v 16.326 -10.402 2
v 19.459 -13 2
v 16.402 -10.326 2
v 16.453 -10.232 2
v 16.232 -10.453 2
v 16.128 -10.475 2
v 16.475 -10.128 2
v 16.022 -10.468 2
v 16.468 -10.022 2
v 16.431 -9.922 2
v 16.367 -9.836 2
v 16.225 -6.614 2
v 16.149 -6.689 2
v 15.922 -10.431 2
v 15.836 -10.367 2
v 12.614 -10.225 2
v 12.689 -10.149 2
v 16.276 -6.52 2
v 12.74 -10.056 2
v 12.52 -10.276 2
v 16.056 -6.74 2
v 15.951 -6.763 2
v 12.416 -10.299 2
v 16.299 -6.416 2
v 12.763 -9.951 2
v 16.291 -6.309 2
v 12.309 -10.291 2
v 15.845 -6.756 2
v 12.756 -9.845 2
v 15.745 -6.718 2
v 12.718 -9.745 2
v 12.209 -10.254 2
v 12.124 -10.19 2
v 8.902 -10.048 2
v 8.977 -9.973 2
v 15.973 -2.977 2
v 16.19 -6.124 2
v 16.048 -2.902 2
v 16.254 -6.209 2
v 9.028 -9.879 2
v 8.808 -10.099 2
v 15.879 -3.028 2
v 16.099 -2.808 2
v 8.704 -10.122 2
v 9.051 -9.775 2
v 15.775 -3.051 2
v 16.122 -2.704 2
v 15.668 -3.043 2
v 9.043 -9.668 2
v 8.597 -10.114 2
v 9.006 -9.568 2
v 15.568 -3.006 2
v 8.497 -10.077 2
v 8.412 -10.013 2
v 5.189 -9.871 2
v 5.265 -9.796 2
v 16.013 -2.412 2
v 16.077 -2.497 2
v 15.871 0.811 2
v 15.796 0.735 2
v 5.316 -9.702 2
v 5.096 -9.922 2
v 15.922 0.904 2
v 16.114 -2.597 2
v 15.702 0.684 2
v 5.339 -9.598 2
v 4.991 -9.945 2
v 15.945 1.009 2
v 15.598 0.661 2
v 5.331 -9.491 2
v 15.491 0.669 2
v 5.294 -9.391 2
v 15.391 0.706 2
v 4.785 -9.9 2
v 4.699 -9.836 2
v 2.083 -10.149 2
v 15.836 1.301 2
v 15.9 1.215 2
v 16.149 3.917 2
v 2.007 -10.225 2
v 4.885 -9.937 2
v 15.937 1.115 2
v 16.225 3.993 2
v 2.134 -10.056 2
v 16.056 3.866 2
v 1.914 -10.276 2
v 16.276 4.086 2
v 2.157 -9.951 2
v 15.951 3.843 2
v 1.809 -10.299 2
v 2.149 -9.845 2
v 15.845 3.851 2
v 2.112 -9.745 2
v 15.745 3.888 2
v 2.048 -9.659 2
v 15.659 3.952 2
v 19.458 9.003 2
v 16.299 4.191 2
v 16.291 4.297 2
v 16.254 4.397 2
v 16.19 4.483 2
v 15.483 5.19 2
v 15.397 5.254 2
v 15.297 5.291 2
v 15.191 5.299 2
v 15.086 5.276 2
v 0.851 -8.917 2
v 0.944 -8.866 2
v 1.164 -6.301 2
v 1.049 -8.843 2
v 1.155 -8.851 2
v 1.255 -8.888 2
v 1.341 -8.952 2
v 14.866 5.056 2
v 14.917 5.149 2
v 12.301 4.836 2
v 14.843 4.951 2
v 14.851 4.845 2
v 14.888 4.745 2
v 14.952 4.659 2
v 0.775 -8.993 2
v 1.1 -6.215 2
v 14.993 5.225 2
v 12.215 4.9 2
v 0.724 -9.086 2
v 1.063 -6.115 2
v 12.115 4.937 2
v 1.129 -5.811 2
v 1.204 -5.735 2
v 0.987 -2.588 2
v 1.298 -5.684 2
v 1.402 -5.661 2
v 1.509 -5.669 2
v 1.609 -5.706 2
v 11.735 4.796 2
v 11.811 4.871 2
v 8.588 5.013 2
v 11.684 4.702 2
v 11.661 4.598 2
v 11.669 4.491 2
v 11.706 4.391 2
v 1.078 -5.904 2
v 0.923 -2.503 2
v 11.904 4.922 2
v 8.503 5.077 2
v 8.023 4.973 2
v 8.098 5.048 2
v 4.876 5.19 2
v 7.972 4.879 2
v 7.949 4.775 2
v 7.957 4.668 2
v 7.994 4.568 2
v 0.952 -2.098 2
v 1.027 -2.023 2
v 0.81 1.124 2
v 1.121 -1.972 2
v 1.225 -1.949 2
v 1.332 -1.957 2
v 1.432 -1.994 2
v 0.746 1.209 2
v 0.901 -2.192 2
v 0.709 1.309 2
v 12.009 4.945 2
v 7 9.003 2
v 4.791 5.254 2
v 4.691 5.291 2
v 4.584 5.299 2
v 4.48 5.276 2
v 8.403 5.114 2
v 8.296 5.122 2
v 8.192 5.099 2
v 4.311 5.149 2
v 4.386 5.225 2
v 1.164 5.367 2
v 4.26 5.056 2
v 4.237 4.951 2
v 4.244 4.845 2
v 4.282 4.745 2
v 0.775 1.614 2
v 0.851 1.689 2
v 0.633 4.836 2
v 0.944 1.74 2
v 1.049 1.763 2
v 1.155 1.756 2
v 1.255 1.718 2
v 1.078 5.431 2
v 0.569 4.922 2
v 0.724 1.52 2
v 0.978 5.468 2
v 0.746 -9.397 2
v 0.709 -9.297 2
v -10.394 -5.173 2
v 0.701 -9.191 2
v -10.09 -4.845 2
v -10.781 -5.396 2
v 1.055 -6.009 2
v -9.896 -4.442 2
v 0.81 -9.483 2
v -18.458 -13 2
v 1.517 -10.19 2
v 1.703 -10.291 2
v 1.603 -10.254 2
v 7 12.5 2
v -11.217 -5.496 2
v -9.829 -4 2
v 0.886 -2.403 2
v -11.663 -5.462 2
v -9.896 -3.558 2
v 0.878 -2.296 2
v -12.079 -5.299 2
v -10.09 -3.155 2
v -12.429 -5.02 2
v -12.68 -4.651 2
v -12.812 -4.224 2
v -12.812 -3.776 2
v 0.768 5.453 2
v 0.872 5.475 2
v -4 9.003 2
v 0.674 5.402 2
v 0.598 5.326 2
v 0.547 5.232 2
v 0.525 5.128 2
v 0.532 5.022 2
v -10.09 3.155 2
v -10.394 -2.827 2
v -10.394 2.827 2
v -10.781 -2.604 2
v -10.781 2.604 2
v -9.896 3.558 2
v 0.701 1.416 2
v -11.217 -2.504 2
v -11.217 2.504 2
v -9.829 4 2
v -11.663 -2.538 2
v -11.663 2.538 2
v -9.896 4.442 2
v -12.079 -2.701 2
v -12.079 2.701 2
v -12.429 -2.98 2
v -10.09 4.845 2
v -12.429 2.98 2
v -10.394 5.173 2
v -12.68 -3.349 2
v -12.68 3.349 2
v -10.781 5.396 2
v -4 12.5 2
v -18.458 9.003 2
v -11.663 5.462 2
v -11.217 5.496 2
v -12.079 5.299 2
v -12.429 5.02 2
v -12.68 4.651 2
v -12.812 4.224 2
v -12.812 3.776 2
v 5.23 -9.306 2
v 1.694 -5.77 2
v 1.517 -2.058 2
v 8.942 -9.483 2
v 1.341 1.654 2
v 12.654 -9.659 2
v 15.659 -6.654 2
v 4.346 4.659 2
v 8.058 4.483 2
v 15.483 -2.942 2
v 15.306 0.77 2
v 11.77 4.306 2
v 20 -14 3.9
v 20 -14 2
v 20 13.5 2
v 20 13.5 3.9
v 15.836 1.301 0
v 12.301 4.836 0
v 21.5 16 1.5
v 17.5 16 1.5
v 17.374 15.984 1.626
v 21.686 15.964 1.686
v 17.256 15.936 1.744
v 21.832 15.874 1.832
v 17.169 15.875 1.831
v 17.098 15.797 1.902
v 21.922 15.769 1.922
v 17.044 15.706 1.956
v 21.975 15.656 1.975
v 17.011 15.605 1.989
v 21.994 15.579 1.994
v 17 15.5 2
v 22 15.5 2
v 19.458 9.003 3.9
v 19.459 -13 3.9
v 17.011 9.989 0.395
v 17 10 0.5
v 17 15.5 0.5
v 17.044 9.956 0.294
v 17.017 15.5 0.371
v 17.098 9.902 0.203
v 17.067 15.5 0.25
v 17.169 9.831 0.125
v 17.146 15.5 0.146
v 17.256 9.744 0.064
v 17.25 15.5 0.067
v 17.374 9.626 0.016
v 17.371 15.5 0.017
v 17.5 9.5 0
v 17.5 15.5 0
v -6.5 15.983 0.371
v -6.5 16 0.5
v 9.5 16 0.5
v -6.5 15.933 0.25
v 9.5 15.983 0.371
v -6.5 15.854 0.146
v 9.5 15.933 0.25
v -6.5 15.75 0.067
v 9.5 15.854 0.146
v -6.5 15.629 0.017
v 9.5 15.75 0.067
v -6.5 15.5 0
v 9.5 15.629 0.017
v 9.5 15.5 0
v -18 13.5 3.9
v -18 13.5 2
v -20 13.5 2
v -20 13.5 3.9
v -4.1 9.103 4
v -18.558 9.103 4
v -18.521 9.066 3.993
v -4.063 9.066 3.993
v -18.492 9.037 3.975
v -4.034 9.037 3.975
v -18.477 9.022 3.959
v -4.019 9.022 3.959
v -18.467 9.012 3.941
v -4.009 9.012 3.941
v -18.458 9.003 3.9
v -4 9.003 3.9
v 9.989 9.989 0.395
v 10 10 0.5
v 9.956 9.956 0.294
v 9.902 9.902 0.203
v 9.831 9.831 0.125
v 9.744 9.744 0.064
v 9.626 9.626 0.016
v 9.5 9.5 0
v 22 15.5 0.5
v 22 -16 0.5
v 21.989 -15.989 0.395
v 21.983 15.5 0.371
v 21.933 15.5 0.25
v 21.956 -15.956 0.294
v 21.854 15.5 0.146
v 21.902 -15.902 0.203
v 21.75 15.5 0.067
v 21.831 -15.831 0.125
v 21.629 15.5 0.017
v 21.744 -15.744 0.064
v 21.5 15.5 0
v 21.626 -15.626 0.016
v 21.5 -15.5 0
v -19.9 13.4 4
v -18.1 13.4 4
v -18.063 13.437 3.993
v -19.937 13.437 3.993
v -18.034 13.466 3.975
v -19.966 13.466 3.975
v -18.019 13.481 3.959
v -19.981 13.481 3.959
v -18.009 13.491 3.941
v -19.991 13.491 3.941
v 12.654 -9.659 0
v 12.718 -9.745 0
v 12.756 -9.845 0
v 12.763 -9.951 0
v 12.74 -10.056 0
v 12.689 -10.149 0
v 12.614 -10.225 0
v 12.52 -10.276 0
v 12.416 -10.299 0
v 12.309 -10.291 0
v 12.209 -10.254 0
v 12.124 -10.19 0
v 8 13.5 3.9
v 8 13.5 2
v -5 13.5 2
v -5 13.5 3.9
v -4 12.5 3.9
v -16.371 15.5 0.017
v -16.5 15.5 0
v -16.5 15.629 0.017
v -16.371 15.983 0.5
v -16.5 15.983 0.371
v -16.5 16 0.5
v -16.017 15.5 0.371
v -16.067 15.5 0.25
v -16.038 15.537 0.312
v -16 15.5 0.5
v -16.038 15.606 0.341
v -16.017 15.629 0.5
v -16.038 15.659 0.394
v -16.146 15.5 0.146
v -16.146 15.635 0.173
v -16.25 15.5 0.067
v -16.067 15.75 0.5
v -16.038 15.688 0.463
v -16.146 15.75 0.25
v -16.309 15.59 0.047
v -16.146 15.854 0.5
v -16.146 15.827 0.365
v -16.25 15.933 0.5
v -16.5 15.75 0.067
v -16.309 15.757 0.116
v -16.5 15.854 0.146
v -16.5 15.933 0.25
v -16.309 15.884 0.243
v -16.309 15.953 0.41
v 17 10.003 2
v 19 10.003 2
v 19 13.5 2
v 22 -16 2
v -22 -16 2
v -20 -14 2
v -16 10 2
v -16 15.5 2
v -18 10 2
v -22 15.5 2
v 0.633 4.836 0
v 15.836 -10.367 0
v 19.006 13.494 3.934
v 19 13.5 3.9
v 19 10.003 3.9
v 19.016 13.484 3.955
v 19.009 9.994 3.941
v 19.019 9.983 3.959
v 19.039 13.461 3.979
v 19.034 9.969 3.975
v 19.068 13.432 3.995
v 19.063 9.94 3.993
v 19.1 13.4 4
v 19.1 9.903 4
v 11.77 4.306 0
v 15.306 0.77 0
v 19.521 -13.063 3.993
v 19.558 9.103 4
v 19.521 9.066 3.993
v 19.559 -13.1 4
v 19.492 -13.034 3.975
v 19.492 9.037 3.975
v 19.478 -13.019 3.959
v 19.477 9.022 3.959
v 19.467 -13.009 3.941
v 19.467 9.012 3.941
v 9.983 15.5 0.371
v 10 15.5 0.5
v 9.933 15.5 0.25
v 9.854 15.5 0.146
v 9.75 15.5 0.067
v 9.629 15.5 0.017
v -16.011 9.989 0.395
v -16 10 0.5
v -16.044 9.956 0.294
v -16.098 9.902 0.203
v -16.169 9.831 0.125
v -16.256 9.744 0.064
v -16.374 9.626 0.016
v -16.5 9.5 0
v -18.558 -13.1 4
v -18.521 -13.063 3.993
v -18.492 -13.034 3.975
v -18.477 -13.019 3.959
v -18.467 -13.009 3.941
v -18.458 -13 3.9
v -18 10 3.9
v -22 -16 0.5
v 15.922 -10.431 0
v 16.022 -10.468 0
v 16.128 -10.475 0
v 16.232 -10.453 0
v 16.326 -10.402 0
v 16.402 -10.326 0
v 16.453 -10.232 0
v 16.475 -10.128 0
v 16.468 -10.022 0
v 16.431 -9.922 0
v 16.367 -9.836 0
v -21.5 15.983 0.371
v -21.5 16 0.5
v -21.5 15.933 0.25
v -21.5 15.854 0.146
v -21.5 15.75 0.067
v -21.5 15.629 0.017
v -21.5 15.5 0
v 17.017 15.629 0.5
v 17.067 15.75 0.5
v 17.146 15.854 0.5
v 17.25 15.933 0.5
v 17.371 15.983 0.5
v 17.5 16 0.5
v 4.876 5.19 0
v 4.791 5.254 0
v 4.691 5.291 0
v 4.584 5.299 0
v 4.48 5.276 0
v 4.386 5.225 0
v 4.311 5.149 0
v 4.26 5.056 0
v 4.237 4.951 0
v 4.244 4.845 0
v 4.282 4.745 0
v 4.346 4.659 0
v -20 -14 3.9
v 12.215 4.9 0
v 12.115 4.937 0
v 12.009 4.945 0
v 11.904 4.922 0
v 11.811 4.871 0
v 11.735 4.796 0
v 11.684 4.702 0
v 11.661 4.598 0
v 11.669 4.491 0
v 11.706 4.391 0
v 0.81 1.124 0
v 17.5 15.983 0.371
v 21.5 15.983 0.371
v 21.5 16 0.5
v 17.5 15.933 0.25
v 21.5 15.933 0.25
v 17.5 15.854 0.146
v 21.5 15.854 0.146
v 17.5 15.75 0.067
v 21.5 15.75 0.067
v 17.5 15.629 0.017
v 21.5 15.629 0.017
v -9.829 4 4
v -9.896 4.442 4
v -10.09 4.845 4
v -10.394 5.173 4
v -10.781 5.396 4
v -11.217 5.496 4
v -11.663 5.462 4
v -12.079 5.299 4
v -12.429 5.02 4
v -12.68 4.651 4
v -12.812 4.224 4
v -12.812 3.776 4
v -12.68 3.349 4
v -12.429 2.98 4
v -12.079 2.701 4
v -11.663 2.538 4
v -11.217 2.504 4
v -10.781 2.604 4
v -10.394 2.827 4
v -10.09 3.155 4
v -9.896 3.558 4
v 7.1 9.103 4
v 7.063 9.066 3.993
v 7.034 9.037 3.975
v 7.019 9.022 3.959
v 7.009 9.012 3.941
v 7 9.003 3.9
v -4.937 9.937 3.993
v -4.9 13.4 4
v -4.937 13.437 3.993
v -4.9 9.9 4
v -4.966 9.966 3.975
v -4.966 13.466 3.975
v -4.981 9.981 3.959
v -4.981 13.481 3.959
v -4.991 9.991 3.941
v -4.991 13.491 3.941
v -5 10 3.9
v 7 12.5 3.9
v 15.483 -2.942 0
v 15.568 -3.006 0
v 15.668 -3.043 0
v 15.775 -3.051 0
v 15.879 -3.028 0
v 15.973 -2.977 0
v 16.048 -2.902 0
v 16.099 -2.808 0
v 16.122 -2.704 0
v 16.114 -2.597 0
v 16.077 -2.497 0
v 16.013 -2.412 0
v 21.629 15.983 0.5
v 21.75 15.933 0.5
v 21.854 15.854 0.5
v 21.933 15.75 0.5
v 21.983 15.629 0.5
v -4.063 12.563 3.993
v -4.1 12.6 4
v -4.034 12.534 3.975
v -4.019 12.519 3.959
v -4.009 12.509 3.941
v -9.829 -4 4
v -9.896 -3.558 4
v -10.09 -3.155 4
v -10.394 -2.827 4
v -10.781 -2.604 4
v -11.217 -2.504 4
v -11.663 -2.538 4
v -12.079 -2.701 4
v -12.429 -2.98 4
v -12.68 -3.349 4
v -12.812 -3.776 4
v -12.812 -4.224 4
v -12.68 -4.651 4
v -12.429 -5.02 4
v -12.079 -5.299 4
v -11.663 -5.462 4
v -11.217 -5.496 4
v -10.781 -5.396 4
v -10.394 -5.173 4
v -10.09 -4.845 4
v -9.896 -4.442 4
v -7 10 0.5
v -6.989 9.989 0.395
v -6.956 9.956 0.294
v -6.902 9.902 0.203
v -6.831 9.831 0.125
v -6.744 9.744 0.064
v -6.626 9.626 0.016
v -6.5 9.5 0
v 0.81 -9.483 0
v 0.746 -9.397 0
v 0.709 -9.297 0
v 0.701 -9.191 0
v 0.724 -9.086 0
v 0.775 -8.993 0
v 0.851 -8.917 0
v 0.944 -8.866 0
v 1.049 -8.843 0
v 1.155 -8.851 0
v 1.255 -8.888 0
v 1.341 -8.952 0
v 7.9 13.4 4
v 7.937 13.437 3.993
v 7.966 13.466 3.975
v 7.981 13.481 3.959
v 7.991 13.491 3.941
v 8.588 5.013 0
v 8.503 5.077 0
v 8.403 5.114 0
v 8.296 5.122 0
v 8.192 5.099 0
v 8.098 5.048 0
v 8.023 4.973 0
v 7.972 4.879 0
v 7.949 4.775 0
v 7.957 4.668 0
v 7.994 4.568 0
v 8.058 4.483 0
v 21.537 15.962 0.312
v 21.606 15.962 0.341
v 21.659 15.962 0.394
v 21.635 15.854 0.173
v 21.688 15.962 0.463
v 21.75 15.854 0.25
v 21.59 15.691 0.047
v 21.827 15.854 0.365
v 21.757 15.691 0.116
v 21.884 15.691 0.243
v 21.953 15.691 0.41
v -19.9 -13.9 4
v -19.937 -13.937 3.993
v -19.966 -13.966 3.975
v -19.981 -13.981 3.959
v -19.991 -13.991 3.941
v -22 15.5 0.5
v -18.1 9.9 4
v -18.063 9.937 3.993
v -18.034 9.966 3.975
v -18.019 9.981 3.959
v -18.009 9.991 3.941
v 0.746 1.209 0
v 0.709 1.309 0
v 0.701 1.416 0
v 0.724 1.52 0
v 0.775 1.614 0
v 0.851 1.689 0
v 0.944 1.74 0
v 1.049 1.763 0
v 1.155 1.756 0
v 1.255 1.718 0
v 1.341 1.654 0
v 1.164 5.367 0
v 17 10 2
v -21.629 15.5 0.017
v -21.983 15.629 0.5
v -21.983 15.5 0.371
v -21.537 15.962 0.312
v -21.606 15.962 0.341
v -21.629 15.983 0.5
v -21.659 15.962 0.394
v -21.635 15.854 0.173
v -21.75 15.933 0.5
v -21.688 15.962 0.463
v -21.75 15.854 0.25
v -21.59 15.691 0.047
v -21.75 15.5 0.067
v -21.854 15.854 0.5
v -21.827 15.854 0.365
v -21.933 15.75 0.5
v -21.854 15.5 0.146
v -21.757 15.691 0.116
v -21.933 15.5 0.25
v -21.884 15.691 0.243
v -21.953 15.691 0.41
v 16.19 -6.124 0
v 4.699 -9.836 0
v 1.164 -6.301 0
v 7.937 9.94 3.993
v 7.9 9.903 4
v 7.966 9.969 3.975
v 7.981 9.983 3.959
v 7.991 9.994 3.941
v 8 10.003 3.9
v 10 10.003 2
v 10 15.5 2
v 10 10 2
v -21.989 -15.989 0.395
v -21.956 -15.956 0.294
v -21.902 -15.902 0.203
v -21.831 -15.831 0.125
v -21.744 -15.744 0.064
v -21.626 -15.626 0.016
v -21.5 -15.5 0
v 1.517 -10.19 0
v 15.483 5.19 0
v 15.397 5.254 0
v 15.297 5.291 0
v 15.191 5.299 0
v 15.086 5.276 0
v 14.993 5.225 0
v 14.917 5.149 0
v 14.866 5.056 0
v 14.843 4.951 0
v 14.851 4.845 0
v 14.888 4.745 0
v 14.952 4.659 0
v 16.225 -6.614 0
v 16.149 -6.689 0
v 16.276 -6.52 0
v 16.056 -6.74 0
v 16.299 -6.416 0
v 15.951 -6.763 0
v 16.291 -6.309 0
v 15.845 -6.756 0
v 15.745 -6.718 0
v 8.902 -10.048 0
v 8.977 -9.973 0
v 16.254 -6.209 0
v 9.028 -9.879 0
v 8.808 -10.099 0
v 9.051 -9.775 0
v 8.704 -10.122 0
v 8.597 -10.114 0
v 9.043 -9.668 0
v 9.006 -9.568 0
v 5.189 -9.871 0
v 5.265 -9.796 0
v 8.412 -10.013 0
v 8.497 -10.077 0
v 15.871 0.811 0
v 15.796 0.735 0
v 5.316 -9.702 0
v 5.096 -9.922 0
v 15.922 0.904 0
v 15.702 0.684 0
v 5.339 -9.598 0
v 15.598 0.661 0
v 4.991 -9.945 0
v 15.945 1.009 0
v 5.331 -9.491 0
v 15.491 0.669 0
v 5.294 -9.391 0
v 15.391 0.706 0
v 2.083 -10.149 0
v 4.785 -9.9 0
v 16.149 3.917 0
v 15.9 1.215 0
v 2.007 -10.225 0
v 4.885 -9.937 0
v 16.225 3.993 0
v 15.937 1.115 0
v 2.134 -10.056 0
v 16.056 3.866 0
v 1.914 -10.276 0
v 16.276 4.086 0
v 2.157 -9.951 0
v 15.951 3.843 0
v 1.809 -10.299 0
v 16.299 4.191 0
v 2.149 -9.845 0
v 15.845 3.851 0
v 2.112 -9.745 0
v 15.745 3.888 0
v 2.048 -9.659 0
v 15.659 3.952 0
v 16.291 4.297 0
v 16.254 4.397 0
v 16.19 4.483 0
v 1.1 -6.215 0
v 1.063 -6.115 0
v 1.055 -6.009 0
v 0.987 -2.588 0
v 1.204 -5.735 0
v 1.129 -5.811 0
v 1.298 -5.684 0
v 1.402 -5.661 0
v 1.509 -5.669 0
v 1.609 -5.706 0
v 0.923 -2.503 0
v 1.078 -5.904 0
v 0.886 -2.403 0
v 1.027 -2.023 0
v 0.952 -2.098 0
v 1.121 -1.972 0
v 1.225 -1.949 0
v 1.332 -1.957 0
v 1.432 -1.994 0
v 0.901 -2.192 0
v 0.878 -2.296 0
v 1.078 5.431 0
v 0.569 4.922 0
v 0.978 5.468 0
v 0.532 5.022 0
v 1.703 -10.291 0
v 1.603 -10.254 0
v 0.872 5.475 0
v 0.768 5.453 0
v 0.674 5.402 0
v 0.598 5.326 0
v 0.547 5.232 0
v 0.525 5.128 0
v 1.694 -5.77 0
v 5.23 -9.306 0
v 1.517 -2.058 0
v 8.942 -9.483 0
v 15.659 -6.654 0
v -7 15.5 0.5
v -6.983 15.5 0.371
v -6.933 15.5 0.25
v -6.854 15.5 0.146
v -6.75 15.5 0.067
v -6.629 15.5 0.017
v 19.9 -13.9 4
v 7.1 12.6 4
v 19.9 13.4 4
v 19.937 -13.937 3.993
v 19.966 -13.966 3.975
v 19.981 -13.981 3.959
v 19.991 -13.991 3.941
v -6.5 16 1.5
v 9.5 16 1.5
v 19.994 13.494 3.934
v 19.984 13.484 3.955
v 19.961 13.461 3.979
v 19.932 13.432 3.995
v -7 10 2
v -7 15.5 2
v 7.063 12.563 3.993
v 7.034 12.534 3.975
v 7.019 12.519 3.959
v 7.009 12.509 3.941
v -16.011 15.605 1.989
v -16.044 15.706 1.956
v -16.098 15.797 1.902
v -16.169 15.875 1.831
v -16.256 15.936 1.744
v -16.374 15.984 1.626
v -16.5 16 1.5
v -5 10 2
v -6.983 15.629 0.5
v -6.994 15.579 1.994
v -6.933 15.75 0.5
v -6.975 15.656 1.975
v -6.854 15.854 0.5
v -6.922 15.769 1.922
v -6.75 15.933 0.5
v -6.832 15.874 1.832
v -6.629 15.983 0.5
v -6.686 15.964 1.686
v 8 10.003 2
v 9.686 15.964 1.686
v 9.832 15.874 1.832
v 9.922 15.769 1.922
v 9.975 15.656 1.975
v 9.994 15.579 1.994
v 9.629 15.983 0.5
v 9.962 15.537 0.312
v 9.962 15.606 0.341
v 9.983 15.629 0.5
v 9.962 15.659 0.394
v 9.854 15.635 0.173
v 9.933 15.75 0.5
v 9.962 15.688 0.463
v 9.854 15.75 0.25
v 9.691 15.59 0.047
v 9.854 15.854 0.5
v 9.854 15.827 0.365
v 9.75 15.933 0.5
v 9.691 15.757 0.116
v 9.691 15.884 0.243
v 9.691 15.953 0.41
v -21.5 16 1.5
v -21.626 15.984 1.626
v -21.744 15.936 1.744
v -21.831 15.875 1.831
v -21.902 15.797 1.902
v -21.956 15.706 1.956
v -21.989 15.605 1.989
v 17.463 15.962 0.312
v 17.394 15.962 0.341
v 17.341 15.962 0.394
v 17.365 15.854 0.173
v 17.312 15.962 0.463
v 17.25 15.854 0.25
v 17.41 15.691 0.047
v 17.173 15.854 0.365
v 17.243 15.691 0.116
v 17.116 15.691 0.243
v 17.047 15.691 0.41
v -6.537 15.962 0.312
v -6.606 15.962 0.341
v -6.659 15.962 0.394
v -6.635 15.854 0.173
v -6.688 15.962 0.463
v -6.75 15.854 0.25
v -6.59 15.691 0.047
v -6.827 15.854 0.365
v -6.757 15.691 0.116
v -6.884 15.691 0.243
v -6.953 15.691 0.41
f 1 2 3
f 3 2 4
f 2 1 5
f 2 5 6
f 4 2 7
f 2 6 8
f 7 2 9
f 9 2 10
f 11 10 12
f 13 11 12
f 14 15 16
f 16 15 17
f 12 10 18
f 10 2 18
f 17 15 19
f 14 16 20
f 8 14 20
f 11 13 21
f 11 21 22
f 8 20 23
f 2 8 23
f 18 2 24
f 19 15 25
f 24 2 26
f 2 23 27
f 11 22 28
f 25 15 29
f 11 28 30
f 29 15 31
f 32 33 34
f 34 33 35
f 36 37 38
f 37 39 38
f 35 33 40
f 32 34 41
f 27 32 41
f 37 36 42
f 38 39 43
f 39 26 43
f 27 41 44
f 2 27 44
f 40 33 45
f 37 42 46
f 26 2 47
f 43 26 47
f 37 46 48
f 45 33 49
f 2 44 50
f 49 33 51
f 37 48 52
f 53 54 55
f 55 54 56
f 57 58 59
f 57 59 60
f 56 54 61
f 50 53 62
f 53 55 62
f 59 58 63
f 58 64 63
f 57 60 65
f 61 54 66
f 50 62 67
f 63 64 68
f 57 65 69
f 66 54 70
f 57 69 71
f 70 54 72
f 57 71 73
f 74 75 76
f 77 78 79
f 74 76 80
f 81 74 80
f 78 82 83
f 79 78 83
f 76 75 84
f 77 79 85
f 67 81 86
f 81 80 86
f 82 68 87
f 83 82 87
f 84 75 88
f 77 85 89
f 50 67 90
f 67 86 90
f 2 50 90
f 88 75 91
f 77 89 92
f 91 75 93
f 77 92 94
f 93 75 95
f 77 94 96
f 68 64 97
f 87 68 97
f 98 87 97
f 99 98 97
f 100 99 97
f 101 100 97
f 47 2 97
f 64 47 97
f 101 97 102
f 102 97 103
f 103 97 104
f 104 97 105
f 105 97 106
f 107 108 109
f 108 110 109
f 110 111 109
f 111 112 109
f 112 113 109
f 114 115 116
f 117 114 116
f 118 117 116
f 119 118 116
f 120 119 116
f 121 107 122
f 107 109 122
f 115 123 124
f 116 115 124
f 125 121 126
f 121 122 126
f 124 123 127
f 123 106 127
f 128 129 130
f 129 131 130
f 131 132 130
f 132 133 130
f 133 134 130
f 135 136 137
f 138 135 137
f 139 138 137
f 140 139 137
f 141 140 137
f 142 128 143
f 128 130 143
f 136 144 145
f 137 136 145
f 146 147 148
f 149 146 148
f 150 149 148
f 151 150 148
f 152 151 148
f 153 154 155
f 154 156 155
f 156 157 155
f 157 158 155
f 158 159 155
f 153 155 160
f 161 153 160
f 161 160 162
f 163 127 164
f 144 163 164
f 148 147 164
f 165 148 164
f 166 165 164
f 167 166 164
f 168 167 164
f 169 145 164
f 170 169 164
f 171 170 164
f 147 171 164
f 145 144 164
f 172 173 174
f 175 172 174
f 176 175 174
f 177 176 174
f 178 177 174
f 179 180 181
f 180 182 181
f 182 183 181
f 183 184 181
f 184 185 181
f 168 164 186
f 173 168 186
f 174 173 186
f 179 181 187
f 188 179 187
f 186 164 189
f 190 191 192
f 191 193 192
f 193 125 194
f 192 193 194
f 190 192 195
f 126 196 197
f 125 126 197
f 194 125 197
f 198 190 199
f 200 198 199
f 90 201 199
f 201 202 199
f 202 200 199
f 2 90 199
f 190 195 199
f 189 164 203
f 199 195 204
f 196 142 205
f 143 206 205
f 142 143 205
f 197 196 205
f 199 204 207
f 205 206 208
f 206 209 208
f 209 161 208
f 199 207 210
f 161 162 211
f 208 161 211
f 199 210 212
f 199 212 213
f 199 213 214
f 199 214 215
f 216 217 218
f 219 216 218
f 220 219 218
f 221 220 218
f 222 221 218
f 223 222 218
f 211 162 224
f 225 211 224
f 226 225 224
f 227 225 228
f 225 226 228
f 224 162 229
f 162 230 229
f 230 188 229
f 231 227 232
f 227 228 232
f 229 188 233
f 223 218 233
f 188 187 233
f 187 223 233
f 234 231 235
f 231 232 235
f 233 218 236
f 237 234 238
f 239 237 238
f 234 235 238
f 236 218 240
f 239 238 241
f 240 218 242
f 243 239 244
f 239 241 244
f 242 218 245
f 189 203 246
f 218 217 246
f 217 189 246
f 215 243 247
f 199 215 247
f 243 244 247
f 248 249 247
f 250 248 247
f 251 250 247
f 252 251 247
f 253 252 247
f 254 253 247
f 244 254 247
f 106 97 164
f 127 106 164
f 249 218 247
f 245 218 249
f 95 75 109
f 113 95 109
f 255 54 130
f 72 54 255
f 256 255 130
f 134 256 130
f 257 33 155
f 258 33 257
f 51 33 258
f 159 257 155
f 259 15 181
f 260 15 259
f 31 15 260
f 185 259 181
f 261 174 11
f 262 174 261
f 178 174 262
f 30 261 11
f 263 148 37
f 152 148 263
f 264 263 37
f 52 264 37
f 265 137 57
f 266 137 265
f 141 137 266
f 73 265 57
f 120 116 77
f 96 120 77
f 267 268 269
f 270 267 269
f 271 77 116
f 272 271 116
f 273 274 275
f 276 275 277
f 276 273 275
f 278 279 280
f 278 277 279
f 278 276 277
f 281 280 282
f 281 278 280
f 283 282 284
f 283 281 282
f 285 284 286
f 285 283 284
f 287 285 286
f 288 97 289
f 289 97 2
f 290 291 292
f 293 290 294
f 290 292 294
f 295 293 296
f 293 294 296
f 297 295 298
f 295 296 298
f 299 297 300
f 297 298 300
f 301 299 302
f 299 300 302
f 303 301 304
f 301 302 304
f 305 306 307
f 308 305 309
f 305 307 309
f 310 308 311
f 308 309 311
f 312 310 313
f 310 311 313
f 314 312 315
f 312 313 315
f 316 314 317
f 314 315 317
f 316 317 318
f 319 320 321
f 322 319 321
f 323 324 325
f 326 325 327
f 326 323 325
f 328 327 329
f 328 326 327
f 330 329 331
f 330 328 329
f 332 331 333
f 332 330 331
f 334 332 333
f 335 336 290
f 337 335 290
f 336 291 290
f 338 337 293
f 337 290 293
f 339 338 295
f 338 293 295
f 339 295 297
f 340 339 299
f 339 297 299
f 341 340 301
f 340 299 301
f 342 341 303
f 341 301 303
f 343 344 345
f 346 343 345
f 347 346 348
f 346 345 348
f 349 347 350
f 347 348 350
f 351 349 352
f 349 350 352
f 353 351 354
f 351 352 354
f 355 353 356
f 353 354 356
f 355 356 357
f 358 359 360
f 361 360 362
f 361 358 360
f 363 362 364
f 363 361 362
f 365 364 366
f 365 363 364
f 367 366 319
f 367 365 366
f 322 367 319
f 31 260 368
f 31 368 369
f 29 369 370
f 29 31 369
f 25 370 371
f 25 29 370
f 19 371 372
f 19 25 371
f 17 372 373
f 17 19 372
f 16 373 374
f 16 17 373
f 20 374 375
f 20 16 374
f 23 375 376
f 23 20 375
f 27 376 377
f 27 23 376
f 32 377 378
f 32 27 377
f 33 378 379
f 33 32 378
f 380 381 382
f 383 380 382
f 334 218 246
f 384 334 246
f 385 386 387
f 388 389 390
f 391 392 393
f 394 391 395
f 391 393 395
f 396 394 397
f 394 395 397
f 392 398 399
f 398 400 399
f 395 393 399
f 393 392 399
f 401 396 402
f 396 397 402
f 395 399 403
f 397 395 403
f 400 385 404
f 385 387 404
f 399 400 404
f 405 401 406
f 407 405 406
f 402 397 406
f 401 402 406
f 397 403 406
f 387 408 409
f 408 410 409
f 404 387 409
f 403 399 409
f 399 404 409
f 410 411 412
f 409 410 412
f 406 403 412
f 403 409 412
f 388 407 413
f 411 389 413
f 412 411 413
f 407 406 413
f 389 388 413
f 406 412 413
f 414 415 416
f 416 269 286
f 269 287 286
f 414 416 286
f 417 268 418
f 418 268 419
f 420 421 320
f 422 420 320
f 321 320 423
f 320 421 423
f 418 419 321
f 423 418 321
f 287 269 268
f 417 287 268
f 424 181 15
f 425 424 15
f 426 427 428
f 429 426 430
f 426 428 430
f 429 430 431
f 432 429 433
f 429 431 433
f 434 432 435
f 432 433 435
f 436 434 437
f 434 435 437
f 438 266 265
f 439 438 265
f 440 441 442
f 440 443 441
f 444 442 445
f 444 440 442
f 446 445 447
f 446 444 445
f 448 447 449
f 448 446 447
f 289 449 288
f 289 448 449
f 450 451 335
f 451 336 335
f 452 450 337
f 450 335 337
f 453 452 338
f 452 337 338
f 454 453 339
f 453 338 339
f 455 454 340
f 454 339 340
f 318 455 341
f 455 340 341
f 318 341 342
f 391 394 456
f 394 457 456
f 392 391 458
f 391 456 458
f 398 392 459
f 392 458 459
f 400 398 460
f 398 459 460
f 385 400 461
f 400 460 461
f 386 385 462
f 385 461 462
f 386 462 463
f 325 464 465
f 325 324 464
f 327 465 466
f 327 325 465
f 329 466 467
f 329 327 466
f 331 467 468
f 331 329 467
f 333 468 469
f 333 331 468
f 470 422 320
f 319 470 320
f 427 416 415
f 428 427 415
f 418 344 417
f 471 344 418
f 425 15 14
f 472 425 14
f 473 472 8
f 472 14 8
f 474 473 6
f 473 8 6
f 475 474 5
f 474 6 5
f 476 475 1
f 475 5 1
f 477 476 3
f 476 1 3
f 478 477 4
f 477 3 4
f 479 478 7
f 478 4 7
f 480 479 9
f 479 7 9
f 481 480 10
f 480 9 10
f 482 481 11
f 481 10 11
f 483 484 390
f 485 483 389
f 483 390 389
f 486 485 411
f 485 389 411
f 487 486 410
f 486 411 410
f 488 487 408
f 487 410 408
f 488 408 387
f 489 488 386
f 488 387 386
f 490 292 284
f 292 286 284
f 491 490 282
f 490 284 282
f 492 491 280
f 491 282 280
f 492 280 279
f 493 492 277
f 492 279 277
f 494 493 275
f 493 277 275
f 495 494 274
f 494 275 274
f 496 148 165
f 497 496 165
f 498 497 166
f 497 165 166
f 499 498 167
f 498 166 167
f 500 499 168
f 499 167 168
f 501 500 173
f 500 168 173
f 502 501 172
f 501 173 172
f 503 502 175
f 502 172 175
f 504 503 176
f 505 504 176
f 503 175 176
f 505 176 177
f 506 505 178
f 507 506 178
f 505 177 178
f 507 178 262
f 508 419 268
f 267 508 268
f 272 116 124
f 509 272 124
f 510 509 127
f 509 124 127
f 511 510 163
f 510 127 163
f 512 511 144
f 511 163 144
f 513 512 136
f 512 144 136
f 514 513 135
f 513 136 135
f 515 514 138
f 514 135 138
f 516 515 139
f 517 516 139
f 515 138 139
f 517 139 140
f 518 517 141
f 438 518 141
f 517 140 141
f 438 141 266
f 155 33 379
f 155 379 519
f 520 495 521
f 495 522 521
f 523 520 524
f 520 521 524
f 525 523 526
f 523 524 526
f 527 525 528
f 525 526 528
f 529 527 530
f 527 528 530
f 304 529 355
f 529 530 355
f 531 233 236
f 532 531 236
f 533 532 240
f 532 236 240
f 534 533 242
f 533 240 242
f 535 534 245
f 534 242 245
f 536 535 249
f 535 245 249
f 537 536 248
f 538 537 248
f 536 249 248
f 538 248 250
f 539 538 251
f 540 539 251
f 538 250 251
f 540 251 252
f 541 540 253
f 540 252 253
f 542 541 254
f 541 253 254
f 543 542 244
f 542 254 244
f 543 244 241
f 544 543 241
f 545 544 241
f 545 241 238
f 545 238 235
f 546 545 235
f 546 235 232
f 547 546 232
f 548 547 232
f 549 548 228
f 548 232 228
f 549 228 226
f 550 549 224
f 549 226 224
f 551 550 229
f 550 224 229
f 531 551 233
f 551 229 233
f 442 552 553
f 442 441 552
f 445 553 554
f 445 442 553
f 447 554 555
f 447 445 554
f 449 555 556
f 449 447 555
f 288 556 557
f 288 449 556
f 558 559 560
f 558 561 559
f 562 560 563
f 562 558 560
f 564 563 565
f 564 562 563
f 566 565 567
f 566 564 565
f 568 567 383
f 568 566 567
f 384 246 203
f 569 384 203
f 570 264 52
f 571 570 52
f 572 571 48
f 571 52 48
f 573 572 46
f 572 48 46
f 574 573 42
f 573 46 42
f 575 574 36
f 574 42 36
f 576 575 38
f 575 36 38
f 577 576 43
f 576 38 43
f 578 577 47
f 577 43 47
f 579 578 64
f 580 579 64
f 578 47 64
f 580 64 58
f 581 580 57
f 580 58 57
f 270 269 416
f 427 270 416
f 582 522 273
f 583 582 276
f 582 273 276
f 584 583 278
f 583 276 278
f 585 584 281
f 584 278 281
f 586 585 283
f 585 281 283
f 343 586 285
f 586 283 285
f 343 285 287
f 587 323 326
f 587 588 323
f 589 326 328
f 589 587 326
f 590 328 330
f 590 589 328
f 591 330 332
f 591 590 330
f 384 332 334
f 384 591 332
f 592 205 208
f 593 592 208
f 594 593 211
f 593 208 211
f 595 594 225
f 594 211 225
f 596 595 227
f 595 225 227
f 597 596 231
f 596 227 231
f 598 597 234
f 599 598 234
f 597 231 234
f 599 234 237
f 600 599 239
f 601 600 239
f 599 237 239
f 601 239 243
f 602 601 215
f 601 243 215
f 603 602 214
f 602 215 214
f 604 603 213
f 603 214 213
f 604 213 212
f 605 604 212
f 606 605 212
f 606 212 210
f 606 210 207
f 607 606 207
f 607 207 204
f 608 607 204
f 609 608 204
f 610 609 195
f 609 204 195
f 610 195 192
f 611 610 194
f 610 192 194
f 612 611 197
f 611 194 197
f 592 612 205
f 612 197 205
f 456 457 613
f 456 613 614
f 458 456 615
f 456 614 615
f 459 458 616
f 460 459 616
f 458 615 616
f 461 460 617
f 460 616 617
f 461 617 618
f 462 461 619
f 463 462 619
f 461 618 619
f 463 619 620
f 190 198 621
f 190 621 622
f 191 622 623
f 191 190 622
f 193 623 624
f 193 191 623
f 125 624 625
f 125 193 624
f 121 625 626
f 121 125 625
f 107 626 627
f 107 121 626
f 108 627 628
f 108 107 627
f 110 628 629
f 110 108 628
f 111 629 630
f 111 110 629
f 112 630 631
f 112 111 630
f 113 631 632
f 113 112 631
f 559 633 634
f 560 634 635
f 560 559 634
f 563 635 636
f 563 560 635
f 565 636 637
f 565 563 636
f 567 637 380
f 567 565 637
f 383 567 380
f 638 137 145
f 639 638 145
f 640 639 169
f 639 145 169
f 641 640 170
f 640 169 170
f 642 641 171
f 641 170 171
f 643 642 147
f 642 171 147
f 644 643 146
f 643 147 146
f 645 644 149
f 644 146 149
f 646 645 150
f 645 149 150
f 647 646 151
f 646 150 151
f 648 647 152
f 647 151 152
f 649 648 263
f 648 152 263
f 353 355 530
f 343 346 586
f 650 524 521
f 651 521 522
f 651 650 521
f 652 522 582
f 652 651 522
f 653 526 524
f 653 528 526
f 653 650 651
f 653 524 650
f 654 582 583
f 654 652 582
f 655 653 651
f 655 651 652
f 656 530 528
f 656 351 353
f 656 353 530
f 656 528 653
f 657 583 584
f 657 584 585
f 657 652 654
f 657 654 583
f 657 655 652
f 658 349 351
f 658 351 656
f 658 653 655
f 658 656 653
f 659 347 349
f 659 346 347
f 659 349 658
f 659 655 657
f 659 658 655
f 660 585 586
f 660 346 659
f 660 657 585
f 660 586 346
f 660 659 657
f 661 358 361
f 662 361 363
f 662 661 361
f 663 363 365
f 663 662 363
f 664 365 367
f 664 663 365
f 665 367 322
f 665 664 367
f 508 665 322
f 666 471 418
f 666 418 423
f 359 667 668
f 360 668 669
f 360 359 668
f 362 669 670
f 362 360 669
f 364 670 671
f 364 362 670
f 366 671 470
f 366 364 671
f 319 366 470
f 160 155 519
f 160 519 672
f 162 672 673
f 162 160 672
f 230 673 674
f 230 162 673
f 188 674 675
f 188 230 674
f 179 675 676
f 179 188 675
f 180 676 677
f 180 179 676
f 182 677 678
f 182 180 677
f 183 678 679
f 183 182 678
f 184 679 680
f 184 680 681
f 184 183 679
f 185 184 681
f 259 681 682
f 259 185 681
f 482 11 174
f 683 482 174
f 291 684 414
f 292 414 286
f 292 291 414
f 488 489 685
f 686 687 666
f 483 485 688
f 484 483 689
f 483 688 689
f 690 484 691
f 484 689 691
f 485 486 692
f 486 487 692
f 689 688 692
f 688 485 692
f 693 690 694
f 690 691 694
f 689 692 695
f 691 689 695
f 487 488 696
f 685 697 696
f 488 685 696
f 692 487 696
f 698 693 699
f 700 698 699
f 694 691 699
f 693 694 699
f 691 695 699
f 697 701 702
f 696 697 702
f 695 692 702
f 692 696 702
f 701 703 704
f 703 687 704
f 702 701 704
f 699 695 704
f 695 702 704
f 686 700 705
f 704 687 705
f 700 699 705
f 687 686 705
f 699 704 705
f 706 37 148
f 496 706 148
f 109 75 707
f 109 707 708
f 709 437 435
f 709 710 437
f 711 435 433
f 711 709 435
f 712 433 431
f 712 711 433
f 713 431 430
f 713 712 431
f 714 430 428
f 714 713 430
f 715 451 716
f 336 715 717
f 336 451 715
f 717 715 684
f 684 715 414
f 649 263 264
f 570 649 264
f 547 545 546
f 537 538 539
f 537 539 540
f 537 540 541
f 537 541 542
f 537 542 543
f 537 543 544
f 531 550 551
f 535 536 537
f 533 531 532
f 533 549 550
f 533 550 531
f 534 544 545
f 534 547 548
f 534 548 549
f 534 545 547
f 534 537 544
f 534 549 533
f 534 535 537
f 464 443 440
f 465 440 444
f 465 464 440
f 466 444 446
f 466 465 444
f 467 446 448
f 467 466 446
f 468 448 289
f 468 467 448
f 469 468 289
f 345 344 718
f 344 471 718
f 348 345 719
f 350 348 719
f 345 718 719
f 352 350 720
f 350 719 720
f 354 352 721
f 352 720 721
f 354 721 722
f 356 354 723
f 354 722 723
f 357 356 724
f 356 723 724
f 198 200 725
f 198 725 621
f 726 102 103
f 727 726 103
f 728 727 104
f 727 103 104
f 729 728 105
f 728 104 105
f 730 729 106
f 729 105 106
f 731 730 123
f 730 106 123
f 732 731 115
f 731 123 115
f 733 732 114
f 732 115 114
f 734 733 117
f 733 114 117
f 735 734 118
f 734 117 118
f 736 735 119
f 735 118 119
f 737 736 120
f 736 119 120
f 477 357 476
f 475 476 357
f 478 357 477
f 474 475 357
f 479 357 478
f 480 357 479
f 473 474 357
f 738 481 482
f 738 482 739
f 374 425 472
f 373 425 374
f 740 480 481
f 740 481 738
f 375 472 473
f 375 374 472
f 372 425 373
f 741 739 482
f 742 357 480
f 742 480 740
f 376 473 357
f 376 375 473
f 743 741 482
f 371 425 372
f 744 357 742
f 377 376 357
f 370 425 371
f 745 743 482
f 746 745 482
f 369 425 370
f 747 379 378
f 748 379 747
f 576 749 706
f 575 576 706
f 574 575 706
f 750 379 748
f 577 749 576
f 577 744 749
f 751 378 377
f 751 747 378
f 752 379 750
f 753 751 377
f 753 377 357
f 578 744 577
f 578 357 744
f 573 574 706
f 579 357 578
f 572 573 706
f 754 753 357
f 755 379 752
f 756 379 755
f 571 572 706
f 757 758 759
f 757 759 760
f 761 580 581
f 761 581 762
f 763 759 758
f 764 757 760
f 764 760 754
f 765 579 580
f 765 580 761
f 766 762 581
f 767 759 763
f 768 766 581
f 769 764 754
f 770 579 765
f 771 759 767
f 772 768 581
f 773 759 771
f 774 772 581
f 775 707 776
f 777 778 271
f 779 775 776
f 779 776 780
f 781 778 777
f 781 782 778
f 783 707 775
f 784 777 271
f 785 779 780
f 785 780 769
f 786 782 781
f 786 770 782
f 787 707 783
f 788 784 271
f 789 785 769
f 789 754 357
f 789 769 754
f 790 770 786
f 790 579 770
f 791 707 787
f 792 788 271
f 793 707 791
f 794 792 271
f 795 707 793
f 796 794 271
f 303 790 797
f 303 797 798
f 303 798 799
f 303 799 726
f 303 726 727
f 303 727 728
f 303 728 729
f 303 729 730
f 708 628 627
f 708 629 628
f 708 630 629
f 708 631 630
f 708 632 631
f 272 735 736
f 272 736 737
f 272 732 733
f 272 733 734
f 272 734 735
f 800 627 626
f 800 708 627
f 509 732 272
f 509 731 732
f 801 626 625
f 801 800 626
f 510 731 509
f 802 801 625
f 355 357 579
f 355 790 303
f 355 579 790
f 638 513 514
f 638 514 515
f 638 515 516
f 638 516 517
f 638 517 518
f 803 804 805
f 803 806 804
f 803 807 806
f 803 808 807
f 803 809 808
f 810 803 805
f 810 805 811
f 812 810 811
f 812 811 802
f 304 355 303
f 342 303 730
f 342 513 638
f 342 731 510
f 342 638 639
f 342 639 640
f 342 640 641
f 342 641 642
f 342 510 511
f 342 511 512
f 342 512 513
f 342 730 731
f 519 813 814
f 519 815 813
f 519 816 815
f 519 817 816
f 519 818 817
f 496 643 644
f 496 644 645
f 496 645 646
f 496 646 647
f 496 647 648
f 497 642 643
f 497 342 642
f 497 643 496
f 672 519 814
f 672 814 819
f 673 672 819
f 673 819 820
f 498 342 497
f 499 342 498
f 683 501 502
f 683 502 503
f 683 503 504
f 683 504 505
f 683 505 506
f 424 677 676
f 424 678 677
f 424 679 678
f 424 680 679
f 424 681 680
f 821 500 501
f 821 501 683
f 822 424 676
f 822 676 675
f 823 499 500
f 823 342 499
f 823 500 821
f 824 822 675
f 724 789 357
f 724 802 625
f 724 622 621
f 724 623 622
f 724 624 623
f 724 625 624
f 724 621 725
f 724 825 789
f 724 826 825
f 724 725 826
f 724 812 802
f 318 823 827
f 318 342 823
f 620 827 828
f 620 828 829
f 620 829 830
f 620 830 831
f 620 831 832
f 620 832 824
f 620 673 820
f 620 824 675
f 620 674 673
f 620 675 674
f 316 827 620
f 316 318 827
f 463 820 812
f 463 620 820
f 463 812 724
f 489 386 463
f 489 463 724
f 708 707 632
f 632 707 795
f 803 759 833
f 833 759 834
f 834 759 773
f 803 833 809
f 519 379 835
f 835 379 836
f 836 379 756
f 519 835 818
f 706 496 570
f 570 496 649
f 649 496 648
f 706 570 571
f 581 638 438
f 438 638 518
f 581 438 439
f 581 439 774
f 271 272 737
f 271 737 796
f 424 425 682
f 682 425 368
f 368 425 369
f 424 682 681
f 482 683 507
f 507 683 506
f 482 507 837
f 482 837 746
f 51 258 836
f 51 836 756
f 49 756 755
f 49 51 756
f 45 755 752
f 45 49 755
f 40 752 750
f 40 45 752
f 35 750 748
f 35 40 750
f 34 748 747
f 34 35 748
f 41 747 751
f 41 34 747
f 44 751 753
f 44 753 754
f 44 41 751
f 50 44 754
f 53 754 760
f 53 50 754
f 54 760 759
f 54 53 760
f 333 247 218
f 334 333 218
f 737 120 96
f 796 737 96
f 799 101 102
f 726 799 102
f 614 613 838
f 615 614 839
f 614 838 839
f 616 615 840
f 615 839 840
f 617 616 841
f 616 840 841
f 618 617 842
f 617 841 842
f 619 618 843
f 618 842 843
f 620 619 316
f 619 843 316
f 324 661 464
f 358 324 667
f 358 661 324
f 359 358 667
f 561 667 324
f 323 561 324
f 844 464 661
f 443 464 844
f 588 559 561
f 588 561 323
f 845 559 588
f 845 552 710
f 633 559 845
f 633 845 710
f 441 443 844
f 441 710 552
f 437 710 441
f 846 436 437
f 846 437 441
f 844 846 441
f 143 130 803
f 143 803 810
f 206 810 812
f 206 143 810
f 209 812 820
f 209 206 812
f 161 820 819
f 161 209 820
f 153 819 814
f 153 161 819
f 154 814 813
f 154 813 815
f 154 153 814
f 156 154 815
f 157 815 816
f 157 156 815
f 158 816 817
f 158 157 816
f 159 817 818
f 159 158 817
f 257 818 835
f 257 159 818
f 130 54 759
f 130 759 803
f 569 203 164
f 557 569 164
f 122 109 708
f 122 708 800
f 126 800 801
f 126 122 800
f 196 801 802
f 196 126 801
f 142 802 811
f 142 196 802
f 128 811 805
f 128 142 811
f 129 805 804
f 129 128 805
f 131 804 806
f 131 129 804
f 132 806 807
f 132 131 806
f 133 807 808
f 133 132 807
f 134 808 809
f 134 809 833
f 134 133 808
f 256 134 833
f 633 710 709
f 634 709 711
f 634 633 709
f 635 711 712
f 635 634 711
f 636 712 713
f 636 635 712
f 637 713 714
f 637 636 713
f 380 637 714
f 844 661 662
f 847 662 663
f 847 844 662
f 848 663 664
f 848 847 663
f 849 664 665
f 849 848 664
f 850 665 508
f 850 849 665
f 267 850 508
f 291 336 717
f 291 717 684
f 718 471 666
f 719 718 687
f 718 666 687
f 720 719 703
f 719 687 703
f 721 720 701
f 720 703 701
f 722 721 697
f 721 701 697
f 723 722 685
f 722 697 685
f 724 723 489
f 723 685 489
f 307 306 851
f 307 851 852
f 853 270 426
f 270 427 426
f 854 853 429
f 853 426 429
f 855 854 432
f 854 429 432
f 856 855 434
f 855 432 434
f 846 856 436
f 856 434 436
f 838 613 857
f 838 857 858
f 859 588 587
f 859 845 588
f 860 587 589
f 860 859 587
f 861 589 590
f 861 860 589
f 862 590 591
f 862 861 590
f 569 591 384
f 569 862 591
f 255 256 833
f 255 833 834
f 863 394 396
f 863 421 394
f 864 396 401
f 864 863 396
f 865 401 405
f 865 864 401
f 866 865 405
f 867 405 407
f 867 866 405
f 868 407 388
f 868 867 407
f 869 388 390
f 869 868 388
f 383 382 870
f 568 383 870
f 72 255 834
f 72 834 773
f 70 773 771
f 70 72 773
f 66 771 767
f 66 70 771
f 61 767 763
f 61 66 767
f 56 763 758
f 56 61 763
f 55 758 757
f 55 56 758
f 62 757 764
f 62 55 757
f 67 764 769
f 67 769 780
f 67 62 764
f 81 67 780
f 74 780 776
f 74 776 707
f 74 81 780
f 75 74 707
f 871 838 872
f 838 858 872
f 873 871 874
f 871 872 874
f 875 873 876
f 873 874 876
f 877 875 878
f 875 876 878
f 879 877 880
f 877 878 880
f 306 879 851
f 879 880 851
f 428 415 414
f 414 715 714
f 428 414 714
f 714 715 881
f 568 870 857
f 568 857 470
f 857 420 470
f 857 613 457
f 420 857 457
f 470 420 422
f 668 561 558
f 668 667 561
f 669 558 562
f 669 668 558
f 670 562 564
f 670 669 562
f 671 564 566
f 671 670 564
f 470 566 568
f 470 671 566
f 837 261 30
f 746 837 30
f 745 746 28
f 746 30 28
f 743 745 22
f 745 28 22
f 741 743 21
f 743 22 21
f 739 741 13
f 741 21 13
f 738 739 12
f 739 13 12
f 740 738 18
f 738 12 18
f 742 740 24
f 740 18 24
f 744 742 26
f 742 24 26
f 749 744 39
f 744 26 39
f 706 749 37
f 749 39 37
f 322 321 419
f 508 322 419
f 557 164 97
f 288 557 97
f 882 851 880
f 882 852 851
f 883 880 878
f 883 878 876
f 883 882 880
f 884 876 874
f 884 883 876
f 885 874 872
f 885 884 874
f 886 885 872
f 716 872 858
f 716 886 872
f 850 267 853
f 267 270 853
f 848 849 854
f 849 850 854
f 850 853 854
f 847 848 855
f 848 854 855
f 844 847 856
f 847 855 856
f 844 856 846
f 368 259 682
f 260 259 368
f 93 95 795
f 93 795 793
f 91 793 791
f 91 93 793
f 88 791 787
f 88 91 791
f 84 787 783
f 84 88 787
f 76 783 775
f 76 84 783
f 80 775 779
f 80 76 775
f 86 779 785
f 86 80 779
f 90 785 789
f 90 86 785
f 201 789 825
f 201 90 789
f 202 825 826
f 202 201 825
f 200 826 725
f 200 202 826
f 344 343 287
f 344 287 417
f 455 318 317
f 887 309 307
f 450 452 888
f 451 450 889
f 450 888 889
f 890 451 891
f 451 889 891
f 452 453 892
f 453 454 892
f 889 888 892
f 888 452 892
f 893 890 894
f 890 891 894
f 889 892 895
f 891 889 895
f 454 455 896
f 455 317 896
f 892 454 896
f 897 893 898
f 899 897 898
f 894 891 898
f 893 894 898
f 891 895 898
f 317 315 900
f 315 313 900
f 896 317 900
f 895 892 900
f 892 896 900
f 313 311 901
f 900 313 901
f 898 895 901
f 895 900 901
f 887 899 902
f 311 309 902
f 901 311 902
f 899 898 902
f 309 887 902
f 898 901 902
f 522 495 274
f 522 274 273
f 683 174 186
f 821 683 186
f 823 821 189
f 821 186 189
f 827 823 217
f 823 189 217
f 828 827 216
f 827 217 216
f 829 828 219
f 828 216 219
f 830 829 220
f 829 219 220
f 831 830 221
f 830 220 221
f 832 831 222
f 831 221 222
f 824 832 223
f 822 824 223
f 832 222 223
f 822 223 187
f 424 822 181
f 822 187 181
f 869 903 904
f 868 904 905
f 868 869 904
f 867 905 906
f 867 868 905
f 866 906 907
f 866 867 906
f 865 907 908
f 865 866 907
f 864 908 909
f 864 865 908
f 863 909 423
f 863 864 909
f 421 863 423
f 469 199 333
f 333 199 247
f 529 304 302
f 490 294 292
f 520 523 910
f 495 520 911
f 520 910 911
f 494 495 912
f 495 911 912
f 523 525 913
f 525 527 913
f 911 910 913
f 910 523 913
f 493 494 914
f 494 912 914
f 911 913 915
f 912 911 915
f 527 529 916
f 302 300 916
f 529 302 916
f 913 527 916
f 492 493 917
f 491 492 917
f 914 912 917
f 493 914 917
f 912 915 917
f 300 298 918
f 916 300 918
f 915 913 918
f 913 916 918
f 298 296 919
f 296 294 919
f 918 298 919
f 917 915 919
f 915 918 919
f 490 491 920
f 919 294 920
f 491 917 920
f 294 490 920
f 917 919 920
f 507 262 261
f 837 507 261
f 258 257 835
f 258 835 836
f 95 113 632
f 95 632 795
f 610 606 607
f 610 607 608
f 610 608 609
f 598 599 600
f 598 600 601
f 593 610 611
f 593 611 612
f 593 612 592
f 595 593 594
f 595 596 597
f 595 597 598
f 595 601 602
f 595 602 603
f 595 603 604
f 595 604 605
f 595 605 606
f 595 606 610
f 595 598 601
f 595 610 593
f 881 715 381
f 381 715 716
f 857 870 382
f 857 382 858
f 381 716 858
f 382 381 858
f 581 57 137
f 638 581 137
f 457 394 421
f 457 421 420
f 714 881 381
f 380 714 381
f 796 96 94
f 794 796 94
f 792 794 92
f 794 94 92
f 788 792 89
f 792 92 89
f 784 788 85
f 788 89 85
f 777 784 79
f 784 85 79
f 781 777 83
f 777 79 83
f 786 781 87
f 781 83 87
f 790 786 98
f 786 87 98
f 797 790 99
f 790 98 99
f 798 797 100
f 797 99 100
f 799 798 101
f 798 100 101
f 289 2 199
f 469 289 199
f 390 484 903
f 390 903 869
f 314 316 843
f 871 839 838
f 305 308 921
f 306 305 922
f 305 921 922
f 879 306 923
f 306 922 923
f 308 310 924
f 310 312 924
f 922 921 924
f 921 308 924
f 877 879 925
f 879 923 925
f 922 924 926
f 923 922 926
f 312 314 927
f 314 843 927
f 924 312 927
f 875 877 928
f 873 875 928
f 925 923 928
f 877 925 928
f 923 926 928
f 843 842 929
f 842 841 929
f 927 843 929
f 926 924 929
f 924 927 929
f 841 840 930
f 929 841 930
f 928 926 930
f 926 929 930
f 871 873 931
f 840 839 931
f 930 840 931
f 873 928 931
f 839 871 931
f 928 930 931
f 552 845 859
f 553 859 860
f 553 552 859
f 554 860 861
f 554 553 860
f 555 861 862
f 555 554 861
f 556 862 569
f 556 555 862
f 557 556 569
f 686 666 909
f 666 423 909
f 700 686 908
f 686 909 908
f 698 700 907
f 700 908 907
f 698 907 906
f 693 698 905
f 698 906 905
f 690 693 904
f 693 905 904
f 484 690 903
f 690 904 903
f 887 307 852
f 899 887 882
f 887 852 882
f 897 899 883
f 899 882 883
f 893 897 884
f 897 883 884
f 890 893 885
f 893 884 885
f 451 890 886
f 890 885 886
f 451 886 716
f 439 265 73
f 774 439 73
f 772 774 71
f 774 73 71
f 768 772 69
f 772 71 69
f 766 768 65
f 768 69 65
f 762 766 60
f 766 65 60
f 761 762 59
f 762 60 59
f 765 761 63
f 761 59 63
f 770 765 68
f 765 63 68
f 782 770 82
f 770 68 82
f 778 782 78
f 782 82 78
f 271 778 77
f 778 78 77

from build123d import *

# Parameters (mm, degrees)
BOSS_EXTRUDE1_DEPTH = 2
FILLET1_R           = 0.5
BOSS_EXTRUDE2_DEPTH = 2
FILLET4_R           = 0.1
SKETCH3_R           = 1.5
BOSS_EXTRUDE3_DEPTH = 2
CUT_EXTRUDE4_DEPTH  = 2


with BuildPart() as part:
    # Sketch1 → Boss-Extrude1 (new body)
    with BuildSketch(Plane.XY):
        Polygon((-16, 16), (-16, 10), (-7, 10), (-7, 16), (10, 16), (10, 10), (17, 10), (17, 16), (22, 16), (22, -16), (-22, -16), (-22, 16), align=None)
    extrude(amount=BOSS_EXTRUDE1_DEPTH)

    # Fillet1
    fillet1_edges = [part.edges().sort_by_distance(p)[0] for p in [
        (22, 0, 0),
        (0, -16, 0),
        (-22, 0, 0),
        (-19, 16, 0),
        (-16, 13, 0),
        (-11.5, 10, 0),
        (-7, 13, 0),
        (1.5, 16, 0),
        (10, 13, 0),
        (13.5, 10, 0),
        (17, 13, 0),
        (19.5, 16, 0),
        (22, 16, 1),
        (1.5, 16, 2),
        (-22, 16, 1),
        (-16, 16, 1),
        (-7, 16, 1),
        (10, 16, 1),
        (17, 16, 1),
        (-19, 16, 2),
        (19.5, 16, 2),
    ]]
    fillet(fillet1_edges, radius=FILLET1_R)

    # Sketch2 → Boss-Extrude2 (add)
    with BuildSketch(Plane.XY.offset(2)):
        Polygon((20, 13.5), (19, 13.5), (19, 10.002928169), (8, 10.002928169), (8, 13.5), (-5, 13.5), (-5, 10), (-18, 10), (-18, 13.5), (-20, 13.5), (-20, -14), (20, -14), align=None)
        Polygon((7, 9.002928169), (19.458039892, 9.002928169), (19.458533352, -13), (19, -13), (-18.458039892, -13), (-18.458039892, 9.002928169), (-4, 9.002928169), (-4, 12.5), (7, 12.5), align=None, mode=Mode.SUBTRACT)
    extrude(amount=BOSS_EXTRUDE2_DEPTH)

    # Fillet4
    fillet4_edges = [part.edges().sort_by_distance(p)[0] for p in [
        (13.5, 10.002928169, 4),
        (8, 11.751464084, 4),
        (1.5, 13.5, 4),
        (-5, 11.75, 4),
        (-11.5, 10, 4),
        (-18, 11.75, 4),
        (-19, 13.5, 4),
        (-20, -0.25, 4),
        (0, -14, 4),
        (20, -0.25, 4),
        (19.5, 13.5, 4),
        (19, 11.751464084, 4),
        (-4, 10.751464084, 4),
        (-11.229019946, 9.002928169, 4),
        (-18.458039892, -1.998535916, 4),
        (0.50024673, -13, 4),
        (19.458286622, -1.998535916, 4),
        (13.229019946, 9.002928169, 4),
        (7, 10.751464084, 4),
        (1.5, 12.5, 4),
    ]]
    fillet(fillet4_edges, radius=FILLET4_R)

    # Sketch3 → Boss-Extrude3 (add)
    with BuildSketch(Plane.XY.offset(2)):
        with Locations((-11.329019946, 4)):
            Circle(SKETCH3_R)
        with Locations((-11.329019946, -4)):
            Circle(SKETCH3_R)
    extrude(amount=BOSS_EXTRUDE3_DEPTH)

    # Sketch4 → Cut-Extrude4 (cut)
    with BuildSketch(Plane.XY.offset(2)):
        with BuildLine():
            Line((16.189786245, 4.482679464), (15.482679464, 5.189786245))
            ThreePointArc((15.482679464, 5.189786245), (14.952349378, 5.189786245), (14.952349378, 4.65945616))
            Line((14.952349378, 4.65945616), (15.65945616, 3.952349378))
            ThreePointArc((15.65945616, 3.952349378), (16.189786245, 3.952349378), (16.189786245, 4.482679464))
        make_face()
        with BuildLine():
            Line((15.836232855, 1.300698949), (12.300698949, 4.836232855))
            ThreePointArc((12.300698949, 4.836232855), (11.770368863, 4.836232855), (11.770368863, 4.305902769))
            Line((11.770368863, 4.305902769), (15.305902769, 0.770368863))
            ThreePointArc((15.305902769, 0.770368863), (15.836232855, 0.770368863), (15.836232855, 1.300698949))
        make_face()
        with BuildLine():
            Line((16.01300955, -2.411611652), (8.588388348, 5.01300955))
            ThreePointArc((8.588388348, 5.01300955), (8.058058262, 5.01300955), (8.058058262, 4.482679464))
            Line((8.058058262, 4.482679464), (15.482679464, -2.941941738))
            ThreePointArc((15.482679464, -2.941941738), (16.01300955, -2.941941738), (16.01300955, -2.411611652))
        make_face()
        with BuildLine():
            Line((16.189786245, -6.123922254), (4.876077746, 5.189786245))
            ThreePointArc((4.876077746, 5.189786245), (4.345747661, 5.189786245), (4.345747661, 4.65945616))
            Line((4.345747661, 4.65945616), (15.65945616, -6.654252339))
            ThreePointArc((15.65945616, -6.654252339), (16.189786245, -6.654252339), (16.189786245, -6.123922254))
        make_face()
        with BuildLine():
            Line((0.633437059, 4.836232855), (15.836232855, -10.366562941))
            ThreePointArc((15.836232855, -10.366562941), (16.366562941, -10.366562941), (16.366562941, -9.836232855))
            Line((16.366562941, -9.836232855), (1.163767145, 5.366562941))
            ThreePointArc((1.163767145, 5.366562941), (0.633437059, 5.366562941), (0.633437059, 4.836232855))
        make_face()
        with BuildLine():
            ThreePointArc((0.810213755, 1.123922254), (0.810213755, 1.654252339), (1.34054384, 1.654252339))
            Line((1.34054384, 1.654252339), (12.654252339, -9.65945616))
            ThreePointArc((12.654252339, -9.65945616), (12.654252339, -10.189786245), (12.123922254, -10.189786245))
            Line((12.123922254, -10.189786245), (0.810213755, 1.123922254))
        make_face()
        with BuildLine():
            ThreePointArc((0.98699045, -2.588388348), (0.98699045, -2.058058262), (1.517320536, -2.058058262))
            Line((1.517320536, -2.058058262), (8.941941738, -9.482679464))
            ThreePointArc((8.941941738, -9.482679464), (8.941941738, -10.01300955), (8.411611652, -10.01300955))
            Line((8.411611652, -10.01300955), (0.98699045, -2.588388348))
        make_face()
        with BuildLine():
            ThreePointArc((1.163767145, -6.300698949), (1.163767145, -5.770368863), (1.694097231, -5.770368863))
            Line((1.694097231, -5.770368863), (5.229631137, -9.305902769))
            ThreePointArc((5.229631137, -9.305902769), (5.229631137, -9.836232855), (4.699301051, -9.836232855))
            Line((4.699301051, -9.836232855), (1.163767145, -6.300698949))
        make_face()
        with BuildLine():
            ThreePointArc((0.810213755, -9.482679464), (0.810213755, -8.952349378), (1.34054384, -8.952349378))
            Line((1.34054384, -8.952349378), (2.047650622, -9.65945616))
            ThreePointArc((2.047650622, -9.65945616), (2.047650622, -10.189786245), (1.517320536, -10.189786245))
            Line((1.517320536, -10.189786245), (0.810213755, -9.482679464))
        make_face()
    extrude(amount=-CUT_EXTRUDE4_DEPTH, mode=Mode.SUBTRACT)


solid = part.part
